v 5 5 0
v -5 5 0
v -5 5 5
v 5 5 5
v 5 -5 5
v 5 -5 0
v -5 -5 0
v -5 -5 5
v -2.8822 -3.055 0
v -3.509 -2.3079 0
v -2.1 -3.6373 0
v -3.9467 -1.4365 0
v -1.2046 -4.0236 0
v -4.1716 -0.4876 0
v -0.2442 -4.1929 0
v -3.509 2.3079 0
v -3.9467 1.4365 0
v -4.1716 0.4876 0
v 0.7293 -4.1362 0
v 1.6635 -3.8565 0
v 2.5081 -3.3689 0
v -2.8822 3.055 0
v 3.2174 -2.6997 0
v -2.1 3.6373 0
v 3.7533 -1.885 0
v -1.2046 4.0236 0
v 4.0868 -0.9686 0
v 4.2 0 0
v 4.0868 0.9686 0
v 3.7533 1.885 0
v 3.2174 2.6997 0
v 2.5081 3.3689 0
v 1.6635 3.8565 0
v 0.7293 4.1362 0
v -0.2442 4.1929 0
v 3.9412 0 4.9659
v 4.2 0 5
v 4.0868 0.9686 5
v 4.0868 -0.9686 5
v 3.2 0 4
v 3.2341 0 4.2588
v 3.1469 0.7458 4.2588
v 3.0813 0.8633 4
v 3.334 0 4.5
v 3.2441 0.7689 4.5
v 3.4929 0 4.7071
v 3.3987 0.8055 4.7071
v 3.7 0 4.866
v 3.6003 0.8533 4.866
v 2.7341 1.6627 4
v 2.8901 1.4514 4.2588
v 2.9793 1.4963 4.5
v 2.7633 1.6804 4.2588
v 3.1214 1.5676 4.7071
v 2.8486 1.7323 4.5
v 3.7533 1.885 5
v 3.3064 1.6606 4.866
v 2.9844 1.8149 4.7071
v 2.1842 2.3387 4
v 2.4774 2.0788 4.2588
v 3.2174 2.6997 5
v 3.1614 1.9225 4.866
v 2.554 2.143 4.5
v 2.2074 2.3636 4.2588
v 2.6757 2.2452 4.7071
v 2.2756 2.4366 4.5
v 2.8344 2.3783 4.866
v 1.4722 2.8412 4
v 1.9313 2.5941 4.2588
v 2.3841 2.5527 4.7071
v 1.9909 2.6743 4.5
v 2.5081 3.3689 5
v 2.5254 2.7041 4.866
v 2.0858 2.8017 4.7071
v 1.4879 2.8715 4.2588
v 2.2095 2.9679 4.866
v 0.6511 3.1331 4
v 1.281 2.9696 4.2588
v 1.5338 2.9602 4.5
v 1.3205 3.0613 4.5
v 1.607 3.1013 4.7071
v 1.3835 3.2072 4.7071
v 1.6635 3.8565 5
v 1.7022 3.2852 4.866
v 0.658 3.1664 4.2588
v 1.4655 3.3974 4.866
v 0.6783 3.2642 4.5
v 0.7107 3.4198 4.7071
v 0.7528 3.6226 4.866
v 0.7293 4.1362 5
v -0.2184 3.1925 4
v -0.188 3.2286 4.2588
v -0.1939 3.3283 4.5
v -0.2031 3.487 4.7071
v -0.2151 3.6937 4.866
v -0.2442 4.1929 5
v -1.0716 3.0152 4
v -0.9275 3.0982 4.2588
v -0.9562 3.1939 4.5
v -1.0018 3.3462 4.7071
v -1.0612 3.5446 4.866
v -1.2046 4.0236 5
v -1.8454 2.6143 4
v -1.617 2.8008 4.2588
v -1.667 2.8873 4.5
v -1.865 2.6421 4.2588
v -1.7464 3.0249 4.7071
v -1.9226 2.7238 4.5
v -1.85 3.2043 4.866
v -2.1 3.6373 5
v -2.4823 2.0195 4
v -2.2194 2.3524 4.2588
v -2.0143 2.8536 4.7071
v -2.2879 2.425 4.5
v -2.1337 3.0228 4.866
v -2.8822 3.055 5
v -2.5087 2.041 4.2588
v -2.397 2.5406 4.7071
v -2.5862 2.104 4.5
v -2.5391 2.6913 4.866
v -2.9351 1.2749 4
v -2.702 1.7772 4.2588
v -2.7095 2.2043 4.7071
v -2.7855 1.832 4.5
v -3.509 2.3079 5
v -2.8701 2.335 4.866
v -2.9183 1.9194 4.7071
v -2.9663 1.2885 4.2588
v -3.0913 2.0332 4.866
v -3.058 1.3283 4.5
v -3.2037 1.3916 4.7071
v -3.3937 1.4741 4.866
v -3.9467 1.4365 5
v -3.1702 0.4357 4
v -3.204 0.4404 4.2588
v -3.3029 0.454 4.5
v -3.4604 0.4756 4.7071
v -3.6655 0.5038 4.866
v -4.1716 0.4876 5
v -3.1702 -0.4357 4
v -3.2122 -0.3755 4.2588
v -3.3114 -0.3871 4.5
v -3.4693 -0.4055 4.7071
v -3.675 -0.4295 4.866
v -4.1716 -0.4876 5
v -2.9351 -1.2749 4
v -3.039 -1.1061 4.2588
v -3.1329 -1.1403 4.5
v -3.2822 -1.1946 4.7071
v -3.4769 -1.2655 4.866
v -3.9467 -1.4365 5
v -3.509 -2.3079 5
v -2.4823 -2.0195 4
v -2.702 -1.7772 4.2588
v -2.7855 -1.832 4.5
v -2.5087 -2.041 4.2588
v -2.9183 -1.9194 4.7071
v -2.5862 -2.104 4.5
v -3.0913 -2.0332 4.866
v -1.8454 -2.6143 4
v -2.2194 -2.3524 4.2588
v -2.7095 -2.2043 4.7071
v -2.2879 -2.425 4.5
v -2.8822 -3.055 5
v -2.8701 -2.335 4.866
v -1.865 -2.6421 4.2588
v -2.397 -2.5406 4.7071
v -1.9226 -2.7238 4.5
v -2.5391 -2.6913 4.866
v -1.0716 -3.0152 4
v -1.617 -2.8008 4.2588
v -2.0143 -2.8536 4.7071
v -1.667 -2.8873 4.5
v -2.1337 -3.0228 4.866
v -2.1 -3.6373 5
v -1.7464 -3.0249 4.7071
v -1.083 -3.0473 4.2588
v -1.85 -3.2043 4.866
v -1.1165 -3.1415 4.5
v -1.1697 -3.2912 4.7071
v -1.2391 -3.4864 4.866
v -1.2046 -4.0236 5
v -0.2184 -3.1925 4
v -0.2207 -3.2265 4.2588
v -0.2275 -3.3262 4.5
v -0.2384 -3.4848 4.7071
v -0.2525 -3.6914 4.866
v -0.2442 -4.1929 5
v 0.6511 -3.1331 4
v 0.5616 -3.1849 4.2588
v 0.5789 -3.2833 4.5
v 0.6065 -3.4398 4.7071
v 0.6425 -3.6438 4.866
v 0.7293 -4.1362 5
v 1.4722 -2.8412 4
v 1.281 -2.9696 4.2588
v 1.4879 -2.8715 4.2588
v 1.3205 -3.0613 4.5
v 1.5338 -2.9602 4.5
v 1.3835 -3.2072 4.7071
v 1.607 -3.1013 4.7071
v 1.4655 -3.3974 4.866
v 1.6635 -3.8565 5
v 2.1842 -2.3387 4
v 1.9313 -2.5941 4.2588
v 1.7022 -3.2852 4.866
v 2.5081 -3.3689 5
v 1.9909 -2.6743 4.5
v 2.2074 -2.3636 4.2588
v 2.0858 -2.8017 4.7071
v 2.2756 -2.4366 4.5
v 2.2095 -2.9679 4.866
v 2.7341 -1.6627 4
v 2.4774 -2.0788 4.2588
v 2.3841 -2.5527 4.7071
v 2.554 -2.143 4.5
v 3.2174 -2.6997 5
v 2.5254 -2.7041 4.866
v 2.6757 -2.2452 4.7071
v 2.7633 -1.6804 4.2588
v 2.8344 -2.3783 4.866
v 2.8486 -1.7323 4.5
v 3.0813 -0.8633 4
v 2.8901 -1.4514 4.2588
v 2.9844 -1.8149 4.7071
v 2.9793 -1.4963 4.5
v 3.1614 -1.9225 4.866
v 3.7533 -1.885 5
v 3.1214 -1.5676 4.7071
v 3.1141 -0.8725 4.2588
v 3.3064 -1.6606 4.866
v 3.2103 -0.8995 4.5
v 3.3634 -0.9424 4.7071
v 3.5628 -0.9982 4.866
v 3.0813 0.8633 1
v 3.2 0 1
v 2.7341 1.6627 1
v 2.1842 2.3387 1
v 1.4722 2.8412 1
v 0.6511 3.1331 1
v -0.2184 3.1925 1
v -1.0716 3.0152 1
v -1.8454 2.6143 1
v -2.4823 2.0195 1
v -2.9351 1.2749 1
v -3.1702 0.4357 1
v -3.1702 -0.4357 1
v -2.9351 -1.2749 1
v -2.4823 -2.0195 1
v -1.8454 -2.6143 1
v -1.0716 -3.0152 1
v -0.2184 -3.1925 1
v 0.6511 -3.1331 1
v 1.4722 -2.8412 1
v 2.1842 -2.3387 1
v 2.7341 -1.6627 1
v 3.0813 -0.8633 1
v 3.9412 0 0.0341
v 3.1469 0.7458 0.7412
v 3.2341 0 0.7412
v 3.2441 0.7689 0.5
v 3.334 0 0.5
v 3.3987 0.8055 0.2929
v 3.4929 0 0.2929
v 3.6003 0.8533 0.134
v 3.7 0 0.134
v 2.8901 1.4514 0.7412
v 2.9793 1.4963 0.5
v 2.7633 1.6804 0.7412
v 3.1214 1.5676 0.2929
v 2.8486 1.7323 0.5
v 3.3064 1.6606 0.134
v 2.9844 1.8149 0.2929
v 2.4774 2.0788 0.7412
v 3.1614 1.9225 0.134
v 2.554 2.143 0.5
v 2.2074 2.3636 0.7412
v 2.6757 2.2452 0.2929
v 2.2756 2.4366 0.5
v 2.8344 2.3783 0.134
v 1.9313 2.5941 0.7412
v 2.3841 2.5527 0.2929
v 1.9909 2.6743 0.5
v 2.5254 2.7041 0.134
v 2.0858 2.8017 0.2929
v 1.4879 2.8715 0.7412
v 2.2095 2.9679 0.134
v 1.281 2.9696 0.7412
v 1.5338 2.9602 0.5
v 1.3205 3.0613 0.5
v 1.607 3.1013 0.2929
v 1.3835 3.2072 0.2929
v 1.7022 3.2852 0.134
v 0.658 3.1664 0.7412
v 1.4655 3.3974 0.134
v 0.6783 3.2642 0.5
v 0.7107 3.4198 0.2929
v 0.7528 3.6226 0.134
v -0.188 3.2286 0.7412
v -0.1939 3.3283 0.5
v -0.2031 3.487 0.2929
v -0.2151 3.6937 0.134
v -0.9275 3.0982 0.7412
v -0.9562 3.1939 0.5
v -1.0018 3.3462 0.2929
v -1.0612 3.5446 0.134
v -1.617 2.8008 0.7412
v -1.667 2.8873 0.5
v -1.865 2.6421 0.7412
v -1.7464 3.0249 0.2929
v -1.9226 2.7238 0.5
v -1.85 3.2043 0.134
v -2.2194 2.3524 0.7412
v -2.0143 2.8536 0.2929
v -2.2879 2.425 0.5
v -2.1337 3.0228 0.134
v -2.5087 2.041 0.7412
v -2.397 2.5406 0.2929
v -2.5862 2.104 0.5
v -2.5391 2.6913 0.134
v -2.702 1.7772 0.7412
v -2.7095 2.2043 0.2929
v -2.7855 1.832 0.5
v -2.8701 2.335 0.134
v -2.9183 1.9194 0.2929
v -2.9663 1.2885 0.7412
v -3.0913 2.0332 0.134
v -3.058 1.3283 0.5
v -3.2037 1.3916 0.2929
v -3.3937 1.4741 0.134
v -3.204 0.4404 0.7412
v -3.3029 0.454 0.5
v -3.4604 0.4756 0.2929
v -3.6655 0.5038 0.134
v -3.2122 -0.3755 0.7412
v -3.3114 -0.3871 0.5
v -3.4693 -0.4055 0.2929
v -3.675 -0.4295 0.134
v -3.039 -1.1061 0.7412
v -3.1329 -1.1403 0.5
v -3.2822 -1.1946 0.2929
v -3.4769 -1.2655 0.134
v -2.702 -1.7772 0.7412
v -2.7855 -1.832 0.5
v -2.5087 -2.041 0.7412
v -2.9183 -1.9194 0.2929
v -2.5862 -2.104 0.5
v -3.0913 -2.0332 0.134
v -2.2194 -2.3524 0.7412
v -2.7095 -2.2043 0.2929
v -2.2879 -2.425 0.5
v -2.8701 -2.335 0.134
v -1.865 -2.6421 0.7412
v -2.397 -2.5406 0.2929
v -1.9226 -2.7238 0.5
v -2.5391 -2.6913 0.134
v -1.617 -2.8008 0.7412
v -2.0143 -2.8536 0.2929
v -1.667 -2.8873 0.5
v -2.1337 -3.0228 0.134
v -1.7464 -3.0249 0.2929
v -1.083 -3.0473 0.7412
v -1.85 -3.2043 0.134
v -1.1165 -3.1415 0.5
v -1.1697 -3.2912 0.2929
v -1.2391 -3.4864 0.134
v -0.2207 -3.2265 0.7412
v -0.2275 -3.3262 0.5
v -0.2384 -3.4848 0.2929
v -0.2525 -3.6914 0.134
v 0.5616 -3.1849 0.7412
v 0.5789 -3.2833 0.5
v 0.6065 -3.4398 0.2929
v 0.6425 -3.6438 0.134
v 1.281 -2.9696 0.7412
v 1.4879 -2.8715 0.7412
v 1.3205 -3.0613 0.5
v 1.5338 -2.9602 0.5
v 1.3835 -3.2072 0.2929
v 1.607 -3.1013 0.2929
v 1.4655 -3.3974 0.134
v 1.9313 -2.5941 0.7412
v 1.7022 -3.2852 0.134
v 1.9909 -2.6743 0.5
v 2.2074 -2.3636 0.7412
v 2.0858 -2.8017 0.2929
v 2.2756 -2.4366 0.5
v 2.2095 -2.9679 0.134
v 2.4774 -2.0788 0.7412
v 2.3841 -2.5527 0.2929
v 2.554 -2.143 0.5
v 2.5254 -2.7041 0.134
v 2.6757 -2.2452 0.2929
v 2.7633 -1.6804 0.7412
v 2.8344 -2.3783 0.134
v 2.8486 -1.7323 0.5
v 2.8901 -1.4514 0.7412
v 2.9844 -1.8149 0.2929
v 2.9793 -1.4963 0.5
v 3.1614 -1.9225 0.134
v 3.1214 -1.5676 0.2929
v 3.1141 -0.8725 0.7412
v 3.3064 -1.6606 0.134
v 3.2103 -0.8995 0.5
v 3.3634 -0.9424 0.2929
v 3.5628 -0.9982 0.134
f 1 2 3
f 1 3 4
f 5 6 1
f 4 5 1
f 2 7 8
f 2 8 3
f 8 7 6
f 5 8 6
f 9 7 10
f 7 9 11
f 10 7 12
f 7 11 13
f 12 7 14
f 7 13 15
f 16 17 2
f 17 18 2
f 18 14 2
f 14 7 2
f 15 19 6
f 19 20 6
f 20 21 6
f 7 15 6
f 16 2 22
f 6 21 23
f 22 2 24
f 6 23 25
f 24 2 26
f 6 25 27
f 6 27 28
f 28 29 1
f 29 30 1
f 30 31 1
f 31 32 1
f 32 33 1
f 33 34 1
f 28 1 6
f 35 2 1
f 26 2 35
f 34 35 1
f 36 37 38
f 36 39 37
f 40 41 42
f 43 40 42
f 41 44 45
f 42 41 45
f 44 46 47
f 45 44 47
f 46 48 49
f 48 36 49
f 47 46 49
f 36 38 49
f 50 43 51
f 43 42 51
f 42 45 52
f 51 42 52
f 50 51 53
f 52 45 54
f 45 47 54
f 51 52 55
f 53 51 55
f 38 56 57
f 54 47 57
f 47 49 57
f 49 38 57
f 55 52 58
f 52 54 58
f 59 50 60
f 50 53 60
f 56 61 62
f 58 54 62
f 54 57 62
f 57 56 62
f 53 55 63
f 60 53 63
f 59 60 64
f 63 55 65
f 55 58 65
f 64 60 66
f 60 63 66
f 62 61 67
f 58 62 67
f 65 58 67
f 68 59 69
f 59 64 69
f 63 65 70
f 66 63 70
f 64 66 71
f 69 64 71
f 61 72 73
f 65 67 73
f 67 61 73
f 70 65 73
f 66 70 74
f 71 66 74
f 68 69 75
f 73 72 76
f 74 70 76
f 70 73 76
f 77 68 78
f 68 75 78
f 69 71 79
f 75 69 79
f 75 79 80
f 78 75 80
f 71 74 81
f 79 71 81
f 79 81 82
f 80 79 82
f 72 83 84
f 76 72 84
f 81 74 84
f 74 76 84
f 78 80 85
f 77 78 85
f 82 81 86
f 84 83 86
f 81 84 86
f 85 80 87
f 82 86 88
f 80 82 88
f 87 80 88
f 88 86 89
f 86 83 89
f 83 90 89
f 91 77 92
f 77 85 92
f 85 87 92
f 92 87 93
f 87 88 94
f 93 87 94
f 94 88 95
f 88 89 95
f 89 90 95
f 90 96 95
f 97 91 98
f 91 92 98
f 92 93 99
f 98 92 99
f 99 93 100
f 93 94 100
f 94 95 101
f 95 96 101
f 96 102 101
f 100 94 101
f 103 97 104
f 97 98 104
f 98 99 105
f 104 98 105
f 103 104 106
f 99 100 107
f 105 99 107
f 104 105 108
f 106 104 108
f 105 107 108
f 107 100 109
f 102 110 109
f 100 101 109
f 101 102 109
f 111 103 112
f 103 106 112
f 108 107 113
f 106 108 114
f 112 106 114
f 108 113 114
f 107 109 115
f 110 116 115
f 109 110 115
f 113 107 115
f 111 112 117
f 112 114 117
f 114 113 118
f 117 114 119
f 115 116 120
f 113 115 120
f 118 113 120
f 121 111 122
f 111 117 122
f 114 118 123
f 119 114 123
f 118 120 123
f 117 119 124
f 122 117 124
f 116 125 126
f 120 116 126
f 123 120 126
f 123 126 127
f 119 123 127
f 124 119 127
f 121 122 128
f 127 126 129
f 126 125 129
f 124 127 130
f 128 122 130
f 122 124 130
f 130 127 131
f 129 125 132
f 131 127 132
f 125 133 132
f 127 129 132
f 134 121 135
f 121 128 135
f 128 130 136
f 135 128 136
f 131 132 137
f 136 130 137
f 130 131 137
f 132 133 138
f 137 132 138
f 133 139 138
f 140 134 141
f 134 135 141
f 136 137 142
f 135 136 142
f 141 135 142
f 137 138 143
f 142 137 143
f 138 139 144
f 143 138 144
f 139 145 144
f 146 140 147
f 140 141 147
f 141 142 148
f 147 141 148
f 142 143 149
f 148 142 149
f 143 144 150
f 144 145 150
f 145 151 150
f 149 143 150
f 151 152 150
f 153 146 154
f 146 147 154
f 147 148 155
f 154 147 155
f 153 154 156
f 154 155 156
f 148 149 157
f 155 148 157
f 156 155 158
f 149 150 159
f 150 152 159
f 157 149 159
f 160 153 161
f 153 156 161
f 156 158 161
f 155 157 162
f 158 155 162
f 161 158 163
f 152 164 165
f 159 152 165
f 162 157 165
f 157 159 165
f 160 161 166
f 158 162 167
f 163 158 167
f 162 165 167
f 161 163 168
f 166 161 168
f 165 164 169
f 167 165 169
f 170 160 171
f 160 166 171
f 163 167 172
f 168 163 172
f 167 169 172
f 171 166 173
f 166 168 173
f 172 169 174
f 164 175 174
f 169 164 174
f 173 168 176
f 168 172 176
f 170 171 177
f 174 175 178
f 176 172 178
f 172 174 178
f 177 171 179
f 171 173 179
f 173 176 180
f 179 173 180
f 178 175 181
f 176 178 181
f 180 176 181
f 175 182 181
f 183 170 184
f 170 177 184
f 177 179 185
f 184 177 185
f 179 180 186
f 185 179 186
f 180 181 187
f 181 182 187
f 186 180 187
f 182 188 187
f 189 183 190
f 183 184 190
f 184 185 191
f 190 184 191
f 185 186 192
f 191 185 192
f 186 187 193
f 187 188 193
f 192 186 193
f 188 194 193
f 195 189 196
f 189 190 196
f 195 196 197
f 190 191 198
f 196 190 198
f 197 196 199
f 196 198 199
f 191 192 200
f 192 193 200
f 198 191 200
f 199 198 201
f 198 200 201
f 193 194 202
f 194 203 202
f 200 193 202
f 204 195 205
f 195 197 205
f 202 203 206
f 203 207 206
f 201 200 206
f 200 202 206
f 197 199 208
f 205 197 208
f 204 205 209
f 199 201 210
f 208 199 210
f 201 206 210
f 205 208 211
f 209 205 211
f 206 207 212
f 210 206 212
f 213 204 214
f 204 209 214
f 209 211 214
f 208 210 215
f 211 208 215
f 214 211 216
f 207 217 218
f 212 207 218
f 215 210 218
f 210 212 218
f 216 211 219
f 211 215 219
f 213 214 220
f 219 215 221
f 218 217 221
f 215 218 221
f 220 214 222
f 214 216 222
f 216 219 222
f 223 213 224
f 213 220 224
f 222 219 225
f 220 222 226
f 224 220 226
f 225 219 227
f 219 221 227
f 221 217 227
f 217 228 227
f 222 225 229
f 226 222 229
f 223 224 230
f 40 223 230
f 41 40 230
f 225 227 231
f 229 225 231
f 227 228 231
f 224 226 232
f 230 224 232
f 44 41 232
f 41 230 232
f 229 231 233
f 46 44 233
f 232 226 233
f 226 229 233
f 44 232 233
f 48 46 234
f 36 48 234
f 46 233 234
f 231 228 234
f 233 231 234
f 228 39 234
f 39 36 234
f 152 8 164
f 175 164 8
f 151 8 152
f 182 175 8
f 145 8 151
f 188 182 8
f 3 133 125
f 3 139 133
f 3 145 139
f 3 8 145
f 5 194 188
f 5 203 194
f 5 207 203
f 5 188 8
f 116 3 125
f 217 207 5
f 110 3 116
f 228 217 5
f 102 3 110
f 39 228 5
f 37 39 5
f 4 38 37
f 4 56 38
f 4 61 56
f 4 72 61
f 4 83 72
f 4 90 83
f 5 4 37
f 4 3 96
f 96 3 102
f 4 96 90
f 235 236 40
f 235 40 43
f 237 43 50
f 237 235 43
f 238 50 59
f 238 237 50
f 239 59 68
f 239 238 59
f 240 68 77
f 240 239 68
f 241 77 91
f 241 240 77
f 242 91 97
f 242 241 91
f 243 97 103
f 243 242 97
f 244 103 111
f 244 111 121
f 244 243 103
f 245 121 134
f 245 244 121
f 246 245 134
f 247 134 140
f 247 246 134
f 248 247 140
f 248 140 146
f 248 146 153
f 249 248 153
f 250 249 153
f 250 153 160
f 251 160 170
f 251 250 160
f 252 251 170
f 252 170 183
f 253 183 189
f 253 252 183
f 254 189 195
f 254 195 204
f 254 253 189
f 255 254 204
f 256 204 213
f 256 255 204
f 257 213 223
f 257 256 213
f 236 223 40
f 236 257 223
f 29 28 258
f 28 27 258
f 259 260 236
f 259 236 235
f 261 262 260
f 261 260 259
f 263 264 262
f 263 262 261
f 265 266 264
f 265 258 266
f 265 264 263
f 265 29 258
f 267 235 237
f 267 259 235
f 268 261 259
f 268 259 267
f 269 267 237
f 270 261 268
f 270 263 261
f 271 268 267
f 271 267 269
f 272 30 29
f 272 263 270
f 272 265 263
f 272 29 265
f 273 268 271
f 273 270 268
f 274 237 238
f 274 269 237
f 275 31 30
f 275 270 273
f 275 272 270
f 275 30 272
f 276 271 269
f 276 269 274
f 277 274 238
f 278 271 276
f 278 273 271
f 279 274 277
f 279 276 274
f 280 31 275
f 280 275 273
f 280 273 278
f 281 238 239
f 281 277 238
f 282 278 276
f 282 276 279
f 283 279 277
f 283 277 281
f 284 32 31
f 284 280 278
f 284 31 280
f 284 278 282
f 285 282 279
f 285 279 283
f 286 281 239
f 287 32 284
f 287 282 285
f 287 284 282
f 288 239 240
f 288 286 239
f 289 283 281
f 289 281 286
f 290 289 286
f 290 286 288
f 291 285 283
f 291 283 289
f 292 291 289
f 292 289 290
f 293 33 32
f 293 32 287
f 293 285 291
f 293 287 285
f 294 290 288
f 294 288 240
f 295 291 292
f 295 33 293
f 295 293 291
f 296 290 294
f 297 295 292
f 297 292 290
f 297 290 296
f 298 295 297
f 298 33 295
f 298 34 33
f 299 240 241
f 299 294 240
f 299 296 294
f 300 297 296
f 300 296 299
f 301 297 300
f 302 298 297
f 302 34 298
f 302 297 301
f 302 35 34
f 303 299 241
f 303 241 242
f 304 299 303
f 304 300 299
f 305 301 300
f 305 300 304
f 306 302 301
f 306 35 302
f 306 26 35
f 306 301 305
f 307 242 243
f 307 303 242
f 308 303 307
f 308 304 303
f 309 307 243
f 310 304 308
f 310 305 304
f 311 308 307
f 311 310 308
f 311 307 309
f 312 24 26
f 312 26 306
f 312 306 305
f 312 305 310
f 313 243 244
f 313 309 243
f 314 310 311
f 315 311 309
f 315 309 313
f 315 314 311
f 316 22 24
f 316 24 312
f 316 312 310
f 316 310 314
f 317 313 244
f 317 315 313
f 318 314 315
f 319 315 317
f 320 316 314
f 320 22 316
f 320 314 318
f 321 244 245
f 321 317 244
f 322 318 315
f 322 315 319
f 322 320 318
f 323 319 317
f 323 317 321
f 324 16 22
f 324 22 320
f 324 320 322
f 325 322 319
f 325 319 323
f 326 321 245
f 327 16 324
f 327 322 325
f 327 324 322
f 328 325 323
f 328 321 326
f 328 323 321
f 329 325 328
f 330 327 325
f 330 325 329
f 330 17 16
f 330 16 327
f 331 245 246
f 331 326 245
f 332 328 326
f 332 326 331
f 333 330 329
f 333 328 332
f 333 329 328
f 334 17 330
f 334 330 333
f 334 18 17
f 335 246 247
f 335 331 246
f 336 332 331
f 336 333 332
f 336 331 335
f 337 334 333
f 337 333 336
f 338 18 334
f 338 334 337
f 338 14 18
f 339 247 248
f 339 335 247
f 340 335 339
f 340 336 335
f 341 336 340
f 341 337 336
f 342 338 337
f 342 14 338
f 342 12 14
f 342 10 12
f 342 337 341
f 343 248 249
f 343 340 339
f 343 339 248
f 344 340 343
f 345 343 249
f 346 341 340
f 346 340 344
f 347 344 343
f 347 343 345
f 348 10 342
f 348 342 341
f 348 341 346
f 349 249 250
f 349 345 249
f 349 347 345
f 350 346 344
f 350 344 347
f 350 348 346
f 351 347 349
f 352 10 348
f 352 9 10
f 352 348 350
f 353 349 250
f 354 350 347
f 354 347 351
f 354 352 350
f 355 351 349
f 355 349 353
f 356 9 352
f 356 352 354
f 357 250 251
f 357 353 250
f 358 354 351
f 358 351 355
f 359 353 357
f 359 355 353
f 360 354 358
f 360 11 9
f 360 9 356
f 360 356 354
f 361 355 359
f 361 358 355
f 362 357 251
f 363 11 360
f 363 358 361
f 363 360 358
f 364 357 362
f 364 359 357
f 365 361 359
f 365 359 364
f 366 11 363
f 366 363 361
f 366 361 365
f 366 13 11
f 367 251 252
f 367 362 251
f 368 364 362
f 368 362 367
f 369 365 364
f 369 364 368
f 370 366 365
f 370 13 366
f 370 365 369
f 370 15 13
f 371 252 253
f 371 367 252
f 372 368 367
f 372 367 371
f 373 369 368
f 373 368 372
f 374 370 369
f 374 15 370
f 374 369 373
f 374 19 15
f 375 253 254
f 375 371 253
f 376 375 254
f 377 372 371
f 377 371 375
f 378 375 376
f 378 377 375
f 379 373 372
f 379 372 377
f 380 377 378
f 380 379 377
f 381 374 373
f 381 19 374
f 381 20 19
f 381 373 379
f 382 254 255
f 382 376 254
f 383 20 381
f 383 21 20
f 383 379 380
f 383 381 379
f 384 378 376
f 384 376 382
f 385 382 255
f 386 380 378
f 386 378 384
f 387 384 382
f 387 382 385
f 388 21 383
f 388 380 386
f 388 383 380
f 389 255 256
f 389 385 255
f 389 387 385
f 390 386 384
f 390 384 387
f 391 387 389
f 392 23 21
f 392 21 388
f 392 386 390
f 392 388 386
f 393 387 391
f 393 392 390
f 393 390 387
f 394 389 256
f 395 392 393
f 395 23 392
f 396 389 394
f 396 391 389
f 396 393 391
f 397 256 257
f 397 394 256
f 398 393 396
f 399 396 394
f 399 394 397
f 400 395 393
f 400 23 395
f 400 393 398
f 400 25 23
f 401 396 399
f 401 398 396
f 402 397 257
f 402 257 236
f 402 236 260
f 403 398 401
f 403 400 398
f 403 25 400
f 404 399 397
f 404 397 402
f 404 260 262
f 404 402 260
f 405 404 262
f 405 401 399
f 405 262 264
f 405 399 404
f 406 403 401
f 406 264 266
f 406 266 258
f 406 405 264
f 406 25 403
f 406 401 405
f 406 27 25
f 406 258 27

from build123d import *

# Parameters (mm, degrees)
SKETCH_W    = 10
SKETCH_H    = 10
SKETCH_R    = 3.2
PAD_DEPTH   = 5
FILLET_R    = 1
FILLET001_R = 1


with BuildPart() as part:
    # Sketch → Pad (new body)
    with BuildSketch(Plane.XY):
        Rectangle(SKETCH_W, SKETCH_H)
        Circle(SKETCH_R, mode=Mode.SUBTRACT)
    extrude(amount=PAD_DEPTH)

    # Fillet
    fillet_edges = [part.edges().sort_by_distance(p)[0] for p in [
        (-3.2, 0, 0),
    ]]
    fillet(fillet_edges, radius=FILLET_R)

    # Fillet001
    fillet001_edges = [part.edges().sort_by_distance(p)[0] for p in [
        (-3.2, 0, 5),
    ]]
    fillet(fillet001_edges, radius=FILLET001_R)


solid = part.part
